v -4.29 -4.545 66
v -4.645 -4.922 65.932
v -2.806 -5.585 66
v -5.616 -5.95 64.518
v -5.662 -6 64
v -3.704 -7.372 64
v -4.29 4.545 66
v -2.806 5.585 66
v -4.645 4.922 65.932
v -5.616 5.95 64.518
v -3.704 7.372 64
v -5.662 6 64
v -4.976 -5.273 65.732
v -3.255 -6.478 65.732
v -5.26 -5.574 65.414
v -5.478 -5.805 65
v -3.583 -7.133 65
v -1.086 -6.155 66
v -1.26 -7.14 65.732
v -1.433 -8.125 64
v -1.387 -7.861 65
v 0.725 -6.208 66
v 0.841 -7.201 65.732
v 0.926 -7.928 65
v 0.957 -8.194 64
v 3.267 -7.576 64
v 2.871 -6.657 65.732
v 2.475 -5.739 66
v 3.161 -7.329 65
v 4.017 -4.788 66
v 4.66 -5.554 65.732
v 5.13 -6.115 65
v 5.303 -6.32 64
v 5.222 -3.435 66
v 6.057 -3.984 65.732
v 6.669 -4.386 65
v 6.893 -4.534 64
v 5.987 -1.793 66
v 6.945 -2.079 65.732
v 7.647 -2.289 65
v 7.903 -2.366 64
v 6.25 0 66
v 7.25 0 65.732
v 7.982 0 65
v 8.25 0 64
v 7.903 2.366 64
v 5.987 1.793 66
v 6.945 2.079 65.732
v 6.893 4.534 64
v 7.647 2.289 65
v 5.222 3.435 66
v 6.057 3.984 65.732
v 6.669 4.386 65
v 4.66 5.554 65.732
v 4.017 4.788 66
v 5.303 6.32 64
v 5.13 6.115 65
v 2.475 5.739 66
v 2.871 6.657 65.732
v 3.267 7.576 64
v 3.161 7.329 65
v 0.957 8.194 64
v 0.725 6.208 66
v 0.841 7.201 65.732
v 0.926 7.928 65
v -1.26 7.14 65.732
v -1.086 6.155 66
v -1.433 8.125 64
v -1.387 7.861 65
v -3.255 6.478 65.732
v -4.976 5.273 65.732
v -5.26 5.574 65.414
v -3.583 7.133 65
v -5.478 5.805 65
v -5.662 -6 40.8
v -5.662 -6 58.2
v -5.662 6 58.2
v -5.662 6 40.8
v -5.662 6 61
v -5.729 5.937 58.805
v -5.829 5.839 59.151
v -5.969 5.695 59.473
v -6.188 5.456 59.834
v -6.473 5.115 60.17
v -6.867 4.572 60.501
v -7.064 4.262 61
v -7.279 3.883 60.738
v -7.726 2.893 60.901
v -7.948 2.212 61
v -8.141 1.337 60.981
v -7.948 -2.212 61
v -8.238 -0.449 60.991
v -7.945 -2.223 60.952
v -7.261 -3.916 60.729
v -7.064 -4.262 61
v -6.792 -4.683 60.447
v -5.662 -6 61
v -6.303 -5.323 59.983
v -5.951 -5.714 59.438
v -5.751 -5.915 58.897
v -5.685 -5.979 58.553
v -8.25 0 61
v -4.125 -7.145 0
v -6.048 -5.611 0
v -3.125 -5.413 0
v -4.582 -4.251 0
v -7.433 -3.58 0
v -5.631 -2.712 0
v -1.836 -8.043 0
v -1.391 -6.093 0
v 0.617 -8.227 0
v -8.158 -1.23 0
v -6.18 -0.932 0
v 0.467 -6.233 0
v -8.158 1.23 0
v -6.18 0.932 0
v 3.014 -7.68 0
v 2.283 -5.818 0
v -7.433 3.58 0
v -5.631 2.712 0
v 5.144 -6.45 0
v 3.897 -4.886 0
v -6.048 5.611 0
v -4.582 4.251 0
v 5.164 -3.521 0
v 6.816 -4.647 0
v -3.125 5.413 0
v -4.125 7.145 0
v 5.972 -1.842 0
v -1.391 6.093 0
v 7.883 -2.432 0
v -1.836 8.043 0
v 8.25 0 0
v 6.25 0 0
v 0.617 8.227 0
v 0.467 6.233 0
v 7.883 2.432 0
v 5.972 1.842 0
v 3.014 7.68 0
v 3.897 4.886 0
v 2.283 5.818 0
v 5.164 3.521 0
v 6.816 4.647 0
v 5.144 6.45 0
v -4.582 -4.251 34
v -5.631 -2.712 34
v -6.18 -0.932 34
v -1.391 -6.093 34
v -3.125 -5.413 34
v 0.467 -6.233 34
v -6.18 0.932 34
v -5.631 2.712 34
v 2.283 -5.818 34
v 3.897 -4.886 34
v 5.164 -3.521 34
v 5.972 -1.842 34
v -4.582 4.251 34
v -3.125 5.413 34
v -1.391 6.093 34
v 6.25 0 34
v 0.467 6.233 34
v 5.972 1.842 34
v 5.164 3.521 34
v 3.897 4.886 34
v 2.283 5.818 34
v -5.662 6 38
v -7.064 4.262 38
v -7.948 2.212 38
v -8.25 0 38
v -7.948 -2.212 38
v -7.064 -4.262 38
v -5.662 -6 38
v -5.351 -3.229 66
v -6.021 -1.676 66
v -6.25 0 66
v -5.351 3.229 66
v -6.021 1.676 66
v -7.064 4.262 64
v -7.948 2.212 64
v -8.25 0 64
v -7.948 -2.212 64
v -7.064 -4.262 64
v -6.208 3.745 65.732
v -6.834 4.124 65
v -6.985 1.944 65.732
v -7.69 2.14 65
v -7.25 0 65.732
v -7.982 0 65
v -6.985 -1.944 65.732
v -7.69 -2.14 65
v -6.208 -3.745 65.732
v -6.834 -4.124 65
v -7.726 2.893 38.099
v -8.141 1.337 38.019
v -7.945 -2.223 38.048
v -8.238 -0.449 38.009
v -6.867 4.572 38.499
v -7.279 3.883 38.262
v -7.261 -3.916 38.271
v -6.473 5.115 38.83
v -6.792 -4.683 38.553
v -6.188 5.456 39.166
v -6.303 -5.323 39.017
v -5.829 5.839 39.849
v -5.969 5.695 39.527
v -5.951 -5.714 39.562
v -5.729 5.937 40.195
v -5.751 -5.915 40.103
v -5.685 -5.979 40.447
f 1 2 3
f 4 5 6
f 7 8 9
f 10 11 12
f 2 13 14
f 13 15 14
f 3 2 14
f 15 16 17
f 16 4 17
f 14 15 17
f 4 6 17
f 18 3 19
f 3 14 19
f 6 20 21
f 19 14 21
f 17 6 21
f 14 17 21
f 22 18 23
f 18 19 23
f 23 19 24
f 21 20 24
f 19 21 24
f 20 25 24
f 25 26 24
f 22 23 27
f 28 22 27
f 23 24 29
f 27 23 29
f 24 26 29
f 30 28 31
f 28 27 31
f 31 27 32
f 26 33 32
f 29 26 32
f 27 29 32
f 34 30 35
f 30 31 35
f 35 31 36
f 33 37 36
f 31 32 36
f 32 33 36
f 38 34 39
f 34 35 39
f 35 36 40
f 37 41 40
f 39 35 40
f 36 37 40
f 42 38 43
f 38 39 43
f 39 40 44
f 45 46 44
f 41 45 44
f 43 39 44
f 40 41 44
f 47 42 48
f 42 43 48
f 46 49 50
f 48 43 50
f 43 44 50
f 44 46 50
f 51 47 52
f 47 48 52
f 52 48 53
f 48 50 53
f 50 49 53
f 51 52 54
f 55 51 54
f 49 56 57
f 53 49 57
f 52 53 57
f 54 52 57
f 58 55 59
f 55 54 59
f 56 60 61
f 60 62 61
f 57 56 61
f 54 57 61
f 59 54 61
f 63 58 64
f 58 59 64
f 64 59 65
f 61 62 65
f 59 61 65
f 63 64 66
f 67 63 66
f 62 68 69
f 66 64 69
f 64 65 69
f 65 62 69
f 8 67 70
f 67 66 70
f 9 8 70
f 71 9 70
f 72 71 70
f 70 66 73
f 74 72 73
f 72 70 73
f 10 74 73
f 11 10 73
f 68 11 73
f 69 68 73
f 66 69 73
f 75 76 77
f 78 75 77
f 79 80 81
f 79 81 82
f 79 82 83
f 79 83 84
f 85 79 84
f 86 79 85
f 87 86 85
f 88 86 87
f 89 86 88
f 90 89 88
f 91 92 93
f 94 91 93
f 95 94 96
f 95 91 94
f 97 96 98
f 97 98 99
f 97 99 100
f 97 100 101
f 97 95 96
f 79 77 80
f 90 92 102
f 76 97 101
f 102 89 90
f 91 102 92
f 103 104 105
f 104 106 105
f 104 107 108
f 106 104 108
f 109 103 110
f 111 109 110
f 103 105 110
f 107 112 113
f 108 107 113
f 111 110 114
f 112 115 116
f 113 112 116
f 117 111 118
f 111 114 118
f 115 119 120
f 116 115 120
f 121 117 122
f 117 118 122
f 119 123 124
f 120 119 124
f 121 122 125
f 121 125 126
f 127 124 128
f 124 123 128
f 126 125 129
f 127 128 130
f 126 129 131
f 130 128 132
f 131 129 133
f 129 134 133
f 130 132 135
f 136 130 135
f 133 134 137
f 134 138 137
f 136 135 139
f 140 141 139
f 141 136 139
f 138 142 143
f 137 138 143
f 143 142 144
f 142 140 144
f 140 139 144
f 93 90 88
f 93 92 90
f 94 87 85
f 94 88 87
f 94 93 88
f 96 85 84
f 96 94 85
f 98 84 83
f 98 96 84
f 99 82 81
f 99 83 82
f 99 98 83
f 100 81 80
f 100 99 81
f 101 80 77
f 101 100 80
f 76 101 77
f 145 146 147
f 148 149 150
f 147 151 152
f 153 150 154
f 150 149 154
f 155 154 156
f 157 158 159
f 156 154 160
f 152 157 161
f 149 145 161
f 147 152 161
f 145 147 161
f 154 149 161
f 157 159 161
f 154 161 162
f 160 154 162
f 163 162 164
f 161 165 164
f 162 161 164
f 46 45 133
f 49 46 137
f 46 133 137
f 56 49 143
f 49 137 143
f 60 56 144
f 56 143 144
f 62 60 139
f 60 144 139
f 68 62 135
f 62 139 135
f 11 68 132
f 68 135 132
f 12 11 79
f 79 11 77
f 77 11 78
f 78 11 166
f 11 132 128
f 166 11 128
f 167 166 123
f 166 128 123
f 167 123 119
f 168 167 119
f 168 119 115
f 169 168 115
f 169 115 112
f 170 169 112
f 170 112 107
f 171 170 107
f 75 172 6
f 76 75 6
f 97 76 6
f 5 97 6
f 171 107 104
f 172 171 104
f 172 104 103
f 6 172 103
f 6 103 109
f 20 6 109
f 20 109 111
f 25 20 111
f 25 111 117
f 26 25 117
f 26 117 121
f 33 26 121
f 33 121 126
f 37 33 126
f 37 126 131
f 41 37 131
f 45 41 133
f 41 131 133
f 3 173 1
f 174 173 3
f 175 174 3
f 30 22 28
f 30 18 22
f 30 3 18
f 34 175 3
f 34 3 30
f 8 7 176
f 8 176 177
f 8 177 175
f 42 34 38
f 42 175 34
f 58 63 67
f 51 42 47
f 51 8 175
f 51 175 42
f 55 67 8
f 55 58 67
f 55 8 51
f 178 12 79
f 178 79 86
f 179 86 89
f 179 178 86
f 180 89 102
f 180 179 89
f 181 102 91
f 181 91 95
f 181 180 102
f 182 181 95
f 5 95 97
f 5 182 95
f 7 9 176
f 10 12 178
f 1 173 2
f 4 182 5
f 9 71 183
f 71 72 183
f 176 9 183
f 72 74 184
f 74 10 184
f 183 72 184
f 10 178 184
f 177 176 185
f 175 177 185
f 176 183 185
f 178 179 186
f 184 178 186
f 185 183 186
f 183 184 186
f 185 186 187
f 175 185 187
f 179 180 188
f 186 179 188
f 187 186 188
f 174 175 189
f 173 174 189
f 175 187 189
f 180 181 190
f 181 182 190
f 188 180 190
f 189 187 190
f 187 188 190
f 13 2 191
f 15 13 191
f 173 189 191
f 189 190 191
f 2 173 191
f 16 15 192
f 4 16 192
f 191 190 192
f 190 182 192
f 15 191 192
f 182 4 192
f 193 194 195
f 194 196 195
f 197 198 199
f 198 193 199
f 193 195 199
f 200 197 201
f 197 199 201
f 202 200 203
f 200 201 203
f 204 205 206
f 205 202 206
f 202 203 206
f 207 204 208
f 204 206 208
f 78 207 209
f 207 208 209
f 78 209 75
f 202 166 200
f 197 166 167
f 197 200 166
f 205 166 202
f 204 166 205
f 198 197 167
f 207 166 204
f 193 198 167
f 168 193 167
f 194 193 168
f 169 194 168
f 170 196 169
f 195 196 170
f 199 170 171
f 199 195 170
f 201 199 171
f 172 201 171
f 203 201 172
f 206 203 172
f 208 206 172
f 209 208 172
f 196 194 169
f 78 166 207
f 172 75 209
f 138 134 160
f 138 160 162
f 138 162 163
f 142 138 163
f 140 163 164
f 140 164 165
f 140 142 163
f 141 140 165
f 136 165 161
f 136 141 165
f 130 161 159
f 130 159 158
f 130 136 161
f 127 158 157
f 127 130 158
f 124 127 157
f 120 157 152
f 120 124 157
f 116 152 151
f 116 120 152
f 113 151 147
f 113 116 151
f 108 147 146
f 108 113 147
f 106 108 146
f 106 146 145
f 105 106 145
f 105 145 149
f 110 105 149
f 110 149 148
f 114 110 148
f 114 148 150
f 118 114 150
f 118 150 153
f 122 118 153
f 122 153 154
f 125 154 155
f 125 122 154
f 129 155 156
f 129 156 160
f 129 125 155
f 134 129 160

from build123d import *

# Parameters (mm, degrees)
F0_R         = 8.25
F0_R_2       = 6.25
F1_DEPTH     = 34
F2_R         = 8.25
F3_DEPTH     = 32
F5_DEPTH     = 28
F6_DEPTH     = 5
F7_T4_DEPTH  = 26
F7_S5_R      = 8.25
F7_T6_DEPTH  = 15
F7_T10_DEPTH = 26
F7_S11_R     = 8.25
F7_T12_DEPTH = 15
F8_R         = 2


# Not quite as in the source:
# - a fillet or chamfer that OpenCascade refuses, or shapes differently, is made with other operations: its cross-section is extruded or revolved along the edge and cut away or added


with BuildPart() as f1:
    # F0 (on Top) → F1 (new body)
    with BuildSketch(Plane.XY):
        Circle(F0_R)
        Circle(F0_R_2, mode=Mode.SUBTRACT)
    extrude(amount=F1_DEPTH)

    # F2 (on face) → F3 (join)
    with BuildSketch(Plane.XY.offset(34)):
        Circle(F2_R)
    extrude(amount=F3_DEPTH)

    # F4 (on face) → F5 (cut)
    with BuildSketch(Plane.XY.offset(66)):
        with BuildLine():
            Line((-5.6623758265, -6), (-5.6623758265, 6))
            ThreePointArc((-5.6623758265, 6), (-8.25, 0), (-5.6623758265, -6))
        make_face()
    extrude(amount=-F5_DEPTH, mode=Mode.SUBTRACT)

    # F4 (on face) → F6 (join)
    with BuildSketch(Plane.XY.offset(66)):
        with BuildLine():
            Line((-5.6623758265, -6), (-5.6623758265, 6))
            ThreePointArc((-5.6623758265, 6), (-8.25, 0), (-5.6623758265, -6))
        make_face()
    extrude(amount=-F6_DEPTH)

    # F7: fillet of radius 2.8 on 2 edges, made by hand


with BuildPart() as f7_tool2:
    # F7_s3 → F7_t4 (new body)
    with BuildSketch(Plane.XZ.offset(13)):
        with BuildLine():
            ThreePointArc((-8.4623758265, 61), (-6.4824768391, 60.1798989873), (-5.6623758265, 58.2))
            Line((-5.6623758265, 58.2), (-5.6623758265, 61))
            Line((-5.6623758265, 61), (-8.4623758265, 61))
        make_face()
    extrude(amount=-F7_T4_DEPTH)

    # F7_s5 → F7_t6 (intersect, symmetric)
    with BuildSketch(Plane.XY.offset(59.6)):
        Circle(F7_S5_R)
    extrude(amount=F7_T6_DEPTH, both=True, mode=Mode.INTERSECT)


with BuildPart() as f1_1:
    add(f1.part)

    # F7_t1: union F7_tool2
    add(f7_tool2.part)


with BuildPart() as f7_tool8:
    # F7_s9 → F7_t10 (new body)
    with BuildSketch(Plane.XZ.offset(13)):
        with BuildLine():
            ThreePointArc((-8.4623758265, 38), (-6.4824768391, 38.8201010127), (-5.6623758265, 40.8))
            Line((-5.6623758265, 40.8), (-5.6623758265, 38))
            Line((-5.6623758265, 38), (-8.4623758265, 38))
        make_face()
    extrude(amount=-F7_T10_DEPTH)

    # F7_s11 → F7_t12 (intersect, symmetric)
    with BuildSketch(Plane.XY.offset(39.4)):
        Circle(F7_S11_R)
    extrude(amount=F7_T12_DEPTH, both=True, mode=Mode.INTERSECT)


with BuildPart() as f1_2:
    add(f1_1.part)

    # F7_t7: union F7_tool8
    add(f7_tool8.part)

    # F8
    f8_edges = [f1_2.edges().sort_by_distance(p)[0] for p in [
        (-8.25, 0, 66),
    ]]
    fillet(f8_edges, radius=F8_R)


solid = f1_2.part
